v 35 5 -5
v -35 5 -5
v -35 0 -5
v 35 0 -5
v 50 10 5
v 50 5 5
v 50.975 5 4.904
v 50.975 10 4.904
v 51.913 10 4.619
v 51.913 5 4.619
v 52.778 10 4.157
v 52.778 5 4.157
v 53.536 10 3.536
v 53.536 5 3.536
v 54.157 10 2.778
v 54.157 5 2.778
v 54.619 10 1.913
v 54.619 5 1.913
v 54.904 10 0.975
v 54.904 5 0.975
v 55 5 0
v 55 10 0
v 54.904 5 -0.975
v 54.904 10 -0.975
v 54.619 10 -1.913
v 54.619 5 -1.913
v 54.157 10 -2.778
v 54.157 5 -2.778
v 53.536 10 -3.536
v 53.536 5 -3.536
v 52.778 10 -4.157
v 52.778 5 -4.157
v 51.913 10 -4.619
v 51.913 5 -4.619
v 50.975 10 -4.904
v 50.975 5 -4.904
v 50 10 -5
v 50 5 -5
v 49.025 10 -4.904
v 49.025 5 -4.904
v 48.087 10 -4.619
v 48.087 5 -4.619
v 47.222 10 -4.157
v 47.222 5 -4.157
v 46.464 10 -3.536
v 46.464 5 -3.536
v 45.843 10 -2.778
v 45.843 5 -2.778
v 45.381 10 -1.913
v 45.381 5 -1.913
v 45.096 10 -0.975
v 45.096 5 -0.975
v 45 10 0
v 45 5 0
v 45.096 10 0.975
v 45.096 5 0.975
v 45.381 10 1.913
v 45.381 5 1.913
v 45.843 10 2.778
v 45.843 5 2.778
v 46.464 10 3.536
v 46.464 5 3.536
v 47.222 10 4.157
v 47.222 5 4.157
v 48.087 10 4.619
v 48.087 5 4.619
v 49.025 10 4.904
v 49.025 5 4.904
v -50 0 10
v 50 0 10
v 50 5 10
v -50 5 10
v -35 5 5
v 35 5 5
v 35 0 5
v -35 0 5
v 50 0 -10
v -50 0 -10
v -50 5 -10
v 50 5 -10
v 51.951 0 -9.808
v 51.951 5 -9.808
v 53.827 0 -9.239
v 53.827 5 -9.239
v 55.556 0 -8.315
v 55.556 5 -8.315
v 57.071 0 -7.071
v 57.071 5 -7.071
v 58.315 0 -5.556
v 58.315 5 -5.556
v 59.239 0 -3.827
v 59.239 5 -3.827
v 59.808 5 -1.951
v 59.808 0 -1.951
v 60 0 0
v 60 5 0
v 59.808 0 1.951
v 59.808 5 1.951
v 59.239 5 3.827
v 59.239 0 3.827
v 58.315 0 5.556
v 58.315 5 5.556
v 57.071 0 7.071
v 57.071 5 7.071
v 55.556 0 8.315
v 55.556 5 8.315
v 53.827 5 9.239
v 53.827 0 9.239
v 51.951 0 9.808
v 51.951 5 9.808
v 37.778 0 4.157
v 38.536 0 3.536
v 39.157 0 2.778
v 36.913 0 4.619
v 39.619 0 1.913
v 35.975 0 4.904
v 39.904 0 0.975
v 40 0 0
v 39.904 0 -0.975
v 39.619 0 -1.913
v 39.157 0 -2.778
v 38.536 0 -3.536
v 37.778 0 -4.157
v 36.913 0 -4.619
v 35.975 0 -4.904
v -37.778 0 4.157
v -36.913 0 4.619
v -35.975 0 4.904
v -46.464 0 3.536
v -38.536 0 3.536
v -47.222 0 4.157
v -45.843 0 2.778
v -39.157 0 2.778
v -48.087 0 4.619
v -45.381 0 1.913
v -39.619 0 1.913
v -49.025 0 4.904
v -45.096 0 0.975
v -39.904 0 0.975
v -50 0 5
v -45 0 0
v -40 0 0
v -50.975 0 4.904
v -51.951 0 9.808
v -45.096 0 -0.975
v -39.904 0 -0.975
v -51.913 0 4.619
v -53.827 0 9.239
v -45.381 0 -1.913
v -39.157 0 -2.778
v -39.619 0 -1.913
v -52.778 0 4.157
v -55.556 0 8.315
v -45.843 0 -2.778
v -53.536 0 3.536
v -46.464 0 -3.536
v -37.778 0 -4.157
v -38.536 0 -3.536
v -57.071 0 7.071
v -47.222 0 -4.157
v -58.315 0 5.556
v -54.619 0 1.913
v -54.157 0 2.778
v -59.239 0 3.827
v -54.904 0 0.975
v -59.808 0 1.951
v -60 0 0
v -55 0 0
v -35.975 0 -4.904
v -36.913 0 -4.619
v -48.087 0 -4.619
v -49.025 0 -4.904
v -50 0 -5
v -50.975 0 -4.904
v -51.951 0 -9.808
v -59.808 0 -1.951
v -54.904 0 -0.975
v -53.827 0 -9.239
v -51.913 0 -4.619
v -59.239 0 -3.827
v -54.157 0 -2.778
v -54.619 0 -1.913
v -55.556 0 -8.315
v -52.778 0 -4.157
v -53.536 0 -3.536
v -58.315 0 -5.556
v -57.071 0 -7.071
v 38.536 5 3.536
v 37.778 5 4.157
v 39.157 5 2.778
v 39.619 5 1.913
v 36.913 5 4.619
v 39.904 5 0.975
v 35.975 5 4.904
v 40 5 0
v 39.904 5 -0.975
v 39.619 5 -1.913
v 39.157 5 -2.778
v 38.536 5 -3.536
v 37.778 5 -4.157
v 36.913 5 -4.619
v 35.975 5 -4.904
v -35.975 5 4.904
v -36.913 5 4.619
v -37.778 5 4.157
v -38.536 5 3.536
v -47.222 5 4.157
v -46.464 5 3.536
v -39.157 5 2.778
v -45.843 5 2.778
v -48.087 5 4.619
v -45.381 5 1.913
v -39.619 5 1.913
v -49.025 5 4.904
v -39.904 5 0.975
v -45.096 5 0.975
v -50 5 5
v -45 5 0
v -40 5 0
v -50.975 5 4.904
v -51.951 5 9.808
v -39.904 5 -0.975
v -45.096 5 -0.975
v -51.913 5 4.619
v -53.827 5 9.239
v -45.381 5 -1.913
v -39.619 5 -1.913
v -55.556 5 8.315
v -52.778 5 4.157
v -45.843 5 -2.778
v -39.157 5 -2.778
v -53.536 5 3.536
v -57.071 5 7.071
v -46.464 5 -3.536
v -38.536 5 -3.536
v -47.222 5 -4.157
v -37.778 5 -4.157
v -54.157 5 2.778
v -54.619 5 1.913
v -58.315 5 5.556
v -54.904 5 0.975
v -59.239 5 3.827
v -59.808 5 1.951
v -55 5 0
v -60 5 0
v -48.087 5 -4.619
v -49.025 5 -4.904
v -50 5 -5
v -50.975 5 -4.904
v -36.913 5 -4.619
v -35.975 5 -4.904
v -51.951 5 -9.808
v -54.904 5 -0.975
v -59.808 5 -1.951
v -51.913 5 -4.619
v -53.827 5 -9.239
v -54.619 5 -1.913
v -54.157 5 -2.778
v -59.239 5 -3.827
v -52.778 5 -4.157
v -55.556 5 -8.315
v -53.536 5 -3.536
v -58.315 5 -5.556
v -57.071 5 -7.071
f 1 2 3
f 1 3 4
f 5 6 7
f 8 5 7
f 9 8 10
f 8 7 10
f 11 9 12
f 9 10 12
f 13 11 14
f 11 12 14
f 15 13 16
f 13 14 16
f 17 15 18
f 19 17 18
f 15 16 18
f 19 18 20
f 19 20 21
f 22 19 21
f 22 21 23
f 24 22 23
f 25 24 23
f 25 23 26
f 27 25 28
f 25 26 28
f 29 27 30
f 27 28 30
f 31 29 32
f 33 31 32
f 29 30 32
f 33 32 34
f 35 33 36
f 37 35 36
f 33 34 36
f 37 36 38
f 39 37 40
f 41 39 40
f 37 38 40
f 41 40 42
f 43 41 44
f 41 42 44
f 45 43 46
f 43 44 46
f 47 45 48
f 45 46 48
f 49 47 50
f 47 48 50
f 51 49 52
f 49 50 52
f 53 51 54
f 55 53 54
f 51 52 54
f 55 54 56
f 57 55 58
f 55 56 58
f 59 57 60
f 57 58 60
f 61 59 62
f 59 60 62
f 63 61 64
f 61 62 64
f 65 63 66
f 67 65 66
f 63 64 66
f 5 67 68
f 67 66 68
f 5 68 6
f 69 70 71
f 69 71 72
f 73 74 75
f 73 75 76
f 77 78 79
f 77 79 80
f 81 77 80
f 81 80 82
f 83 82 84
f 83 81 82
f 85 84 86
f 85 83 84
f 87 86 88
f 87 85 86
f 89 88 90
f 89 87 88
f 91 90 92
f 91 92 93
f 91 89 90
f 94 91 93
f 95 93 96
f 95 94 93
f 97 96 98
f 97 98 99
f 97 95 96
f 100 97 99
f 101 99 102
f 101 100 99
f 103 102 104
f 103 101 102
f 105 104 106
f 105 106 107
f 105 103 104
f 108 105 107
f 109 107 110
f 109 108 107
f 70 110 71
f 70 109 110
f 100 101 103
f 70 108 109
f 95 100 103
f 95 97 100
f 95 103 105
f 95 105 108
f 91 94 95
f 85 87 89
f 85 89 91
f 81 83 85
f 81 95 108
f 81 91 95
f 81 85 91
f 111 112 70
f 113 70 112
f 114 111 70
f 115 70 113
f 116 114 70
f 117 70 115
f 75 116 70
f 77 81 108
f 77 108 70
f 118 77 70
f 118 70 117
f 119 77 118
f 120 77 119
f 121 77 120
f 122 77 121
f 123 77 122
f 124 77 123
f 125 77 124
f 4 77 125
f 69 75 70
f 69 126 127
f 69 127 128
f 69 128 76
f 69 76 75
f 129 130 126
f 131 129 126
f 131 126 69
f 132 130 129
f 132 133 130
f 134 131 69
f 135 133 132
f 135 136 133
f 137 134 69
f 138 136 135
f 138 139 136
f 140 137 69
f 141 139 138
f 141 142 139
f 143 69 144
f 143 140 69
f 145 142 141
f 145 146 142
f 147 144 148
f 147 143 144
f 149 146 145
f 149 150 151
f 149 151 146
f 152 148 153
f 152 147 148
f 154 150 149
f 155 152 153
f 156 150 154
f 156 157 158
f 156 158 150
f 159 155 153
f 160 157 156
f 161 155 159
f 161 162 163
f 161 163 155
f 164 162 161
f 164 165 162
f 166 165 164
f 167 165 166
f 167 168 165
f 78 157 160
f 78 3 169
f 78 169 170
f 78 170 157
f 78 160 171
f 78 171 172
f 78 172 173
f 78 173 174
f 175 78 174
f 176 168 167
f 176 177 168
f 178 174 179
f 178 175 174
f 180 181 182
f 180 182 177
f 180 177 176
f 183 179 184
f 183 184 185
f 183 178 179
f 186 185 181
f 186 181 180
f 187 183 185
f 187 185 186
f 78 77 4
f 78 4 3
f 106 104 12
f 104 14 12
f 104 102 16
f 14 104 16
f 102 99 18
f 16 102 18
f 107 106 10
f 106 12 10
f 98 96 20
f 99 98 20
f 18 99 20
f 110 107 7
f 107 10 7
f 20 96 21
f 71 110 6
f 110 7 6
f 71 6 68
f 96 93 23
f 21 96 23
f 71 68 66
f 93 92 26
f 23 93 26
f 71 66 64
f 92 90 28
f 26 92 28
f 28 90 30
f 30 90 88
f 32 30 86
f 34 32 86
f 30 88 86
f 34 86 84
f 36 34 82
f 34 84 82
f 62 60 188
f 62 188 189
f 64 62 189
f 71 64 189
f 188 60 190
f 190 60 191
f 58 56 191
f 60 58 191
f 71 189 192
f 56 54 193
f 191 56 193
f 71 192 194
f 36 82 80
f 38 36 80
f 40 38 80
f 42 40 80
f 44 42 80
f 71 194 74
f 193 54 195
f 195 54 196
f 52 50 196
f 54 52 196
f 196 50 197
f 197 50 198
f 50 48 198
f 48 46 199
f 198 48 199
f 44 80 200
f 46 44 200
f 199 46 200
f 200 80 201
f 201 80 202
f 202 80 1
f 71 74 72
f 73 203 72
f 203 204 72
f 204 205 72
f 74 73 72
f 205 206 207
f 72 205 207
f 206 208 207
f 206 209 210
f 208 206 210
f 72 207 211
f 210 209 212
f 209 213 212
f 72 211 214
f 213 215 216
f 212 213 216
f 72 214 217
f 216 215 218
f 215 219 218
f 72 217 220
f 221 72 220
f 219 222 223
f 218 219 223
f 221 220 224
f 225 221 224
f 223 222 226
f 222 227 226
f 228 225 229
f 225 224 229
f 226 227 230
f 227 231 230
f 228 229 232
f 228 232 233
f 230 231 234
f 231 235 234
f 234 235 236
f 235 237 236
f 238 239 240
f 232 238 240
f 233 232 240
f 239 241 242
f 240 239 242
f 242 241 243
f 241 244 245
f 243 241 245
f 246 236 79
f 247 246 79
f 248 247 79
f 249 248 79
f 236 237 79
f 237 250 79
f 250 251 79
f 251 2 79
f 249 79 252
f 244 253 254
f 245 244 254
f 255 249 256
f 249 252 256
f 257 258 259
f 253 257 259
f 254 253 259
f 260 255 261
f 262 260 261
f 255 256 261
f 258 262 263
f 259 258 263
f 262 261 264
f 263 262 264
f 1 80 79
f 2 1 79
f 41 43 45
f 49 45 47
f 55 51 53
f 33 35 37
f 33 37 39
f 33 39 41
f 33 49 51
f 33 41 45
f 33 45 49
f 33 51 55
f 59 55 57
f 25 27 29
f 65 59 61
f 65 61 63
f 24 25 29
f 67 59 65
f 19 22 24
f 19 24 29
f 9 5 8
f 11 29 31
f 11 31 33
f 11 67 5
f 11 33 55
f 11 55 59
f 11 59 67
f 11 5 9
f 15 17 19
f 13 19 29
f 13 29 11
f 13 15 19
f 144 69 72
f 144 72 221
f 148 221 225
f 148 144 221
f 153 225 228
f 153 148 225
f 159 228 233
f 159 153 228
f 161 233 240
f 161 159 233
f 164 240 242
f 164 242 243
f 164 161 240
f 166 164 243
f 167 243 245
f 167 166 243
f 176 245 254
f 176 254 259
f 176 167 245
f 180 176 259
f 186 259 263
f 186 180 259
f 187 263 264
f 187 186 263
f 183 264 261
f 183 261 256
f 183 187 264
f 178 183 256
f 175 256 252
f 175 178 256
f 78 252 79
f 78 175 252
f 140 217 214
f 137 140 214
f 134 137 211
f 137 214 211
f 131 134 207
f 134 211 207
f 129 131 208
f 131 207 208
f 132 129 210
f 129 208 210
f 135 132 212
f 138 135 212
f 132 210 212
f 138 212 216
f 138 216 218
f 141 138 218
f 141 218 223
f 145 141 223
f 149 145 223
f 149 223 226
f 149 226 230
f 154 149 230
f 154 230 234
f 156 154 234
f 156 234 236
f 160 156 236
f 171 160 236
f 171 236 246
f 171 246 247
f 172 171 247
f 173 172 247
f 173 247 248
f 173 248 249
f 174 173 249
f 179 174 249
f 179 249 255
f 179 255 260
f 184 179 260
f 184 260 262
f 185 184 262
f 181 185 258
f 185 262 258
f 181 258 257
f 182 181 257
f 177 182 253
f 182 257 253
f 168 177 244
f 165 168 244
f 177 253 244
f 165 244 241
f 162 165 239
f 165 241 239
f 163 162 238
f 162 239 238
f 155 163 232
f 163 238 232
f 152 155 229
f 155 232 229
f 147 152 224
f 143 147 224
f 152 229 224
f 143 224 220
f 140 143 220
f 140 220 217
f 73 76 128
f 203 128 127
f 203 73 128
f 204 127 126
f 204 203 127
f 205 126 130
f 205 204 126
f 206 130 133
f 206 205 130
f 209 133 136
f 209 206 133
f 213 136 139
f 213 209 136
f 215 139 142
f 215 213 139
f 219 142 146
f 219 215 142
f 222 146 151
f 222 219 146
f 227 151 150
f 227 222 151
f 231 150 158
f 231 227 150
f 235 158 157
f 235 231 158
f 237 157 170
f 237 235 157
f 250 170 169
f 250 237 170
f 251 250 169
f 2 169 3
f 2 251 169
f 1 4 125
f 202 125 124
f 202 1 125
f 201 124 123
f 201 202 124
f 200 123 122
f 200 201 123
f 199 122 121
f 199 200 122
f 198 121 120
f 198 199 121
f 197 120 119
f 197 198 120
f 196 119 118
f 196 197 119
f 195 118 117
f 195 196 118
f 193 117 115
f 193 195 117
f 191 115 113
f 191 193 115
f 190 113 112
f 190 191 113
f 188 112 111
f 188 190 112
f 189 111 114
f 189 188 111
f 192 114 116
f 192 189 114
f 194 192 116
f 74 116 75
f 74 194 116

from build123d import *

# Parameters (mm, degrees)
BOSS_EXTRUDE1_DEPTH = 5
CUT_EXTRUDE1_DEPTH  = 62.032778079
SKETCH3_R           = 5
BOSS_EXTRUDE2_DEPTH = 5
SKETCH4_R           = 5
CUT_EXTRUDE2_DEPTH  = 62.032778079


with BuildPart() as part:
    # Sketch1 → Boss-Extrude1 (new body)
    with BuildSketch(Plane(origin=(0, 0, 0), x_dir=(1, 0, 0), z_dir=(0, 1, 0))):
        with BuildLine():
            Line((-50, 10), (50, 10))
            ThreePointArc((50, 10), (60, 0), (50, -10))
            Line((50, -10), (-50, -10))
            ThreePointArc((-50, -10), (-60, 0), (-50, 10))
        make_face()
    extrude(amount=BOSS_EXTRUDE1_DEPTH)

    # Sketch2 → Cut-Extrude1 (cut, through all)
    with BuildSketch(Plane(origin=(0, 5, 0), x_dir=(1, 0, 0), z_dir=(0, 1, 0))):
        with BuildLine():
            Line((-35, 5), (35, 5))
            ThreePointArc((35, 5), (40, 0), (35, -5))
            Line((35, -5), (-35, -5))
            ThreePointArc((-35, -5), (-40, 0), (-35, 5))
        make_face()
    extrude(amount=-CUT_EXTRUDE1_DEPTH, mode=Mode.SUBTRACT)

    # Sketch3 → Boss-Extrude2 (add)
    with BuildSketch(Plane(origin=(0, 5, 0), x_dir=(1, 0, 0), z_dir=(0, 1, 0))):
        with Locations(Location((50, 0, 0), (0, 0, 270))):
            Circle(SKETCH3_R)
    extrude(amount=BOSS_EXTRUDE2_DEPTH)

    # Sketch4 → Cut-Extrude2 (cut, through all)
    with BuildSketch(Plane(origin=(0, 5, 0), x_dir=(1, 0, 0), z_dir=(0, 1, 0))):
        with Locations(Location((-50, 0, 0), (0, 0, 270))):
            Circle(SKETCH4_R)
    extrude(amount=-CUT_EXTRUDE2_DEPTH, mode=Mode.SUBTRACT)


solid = part.part
